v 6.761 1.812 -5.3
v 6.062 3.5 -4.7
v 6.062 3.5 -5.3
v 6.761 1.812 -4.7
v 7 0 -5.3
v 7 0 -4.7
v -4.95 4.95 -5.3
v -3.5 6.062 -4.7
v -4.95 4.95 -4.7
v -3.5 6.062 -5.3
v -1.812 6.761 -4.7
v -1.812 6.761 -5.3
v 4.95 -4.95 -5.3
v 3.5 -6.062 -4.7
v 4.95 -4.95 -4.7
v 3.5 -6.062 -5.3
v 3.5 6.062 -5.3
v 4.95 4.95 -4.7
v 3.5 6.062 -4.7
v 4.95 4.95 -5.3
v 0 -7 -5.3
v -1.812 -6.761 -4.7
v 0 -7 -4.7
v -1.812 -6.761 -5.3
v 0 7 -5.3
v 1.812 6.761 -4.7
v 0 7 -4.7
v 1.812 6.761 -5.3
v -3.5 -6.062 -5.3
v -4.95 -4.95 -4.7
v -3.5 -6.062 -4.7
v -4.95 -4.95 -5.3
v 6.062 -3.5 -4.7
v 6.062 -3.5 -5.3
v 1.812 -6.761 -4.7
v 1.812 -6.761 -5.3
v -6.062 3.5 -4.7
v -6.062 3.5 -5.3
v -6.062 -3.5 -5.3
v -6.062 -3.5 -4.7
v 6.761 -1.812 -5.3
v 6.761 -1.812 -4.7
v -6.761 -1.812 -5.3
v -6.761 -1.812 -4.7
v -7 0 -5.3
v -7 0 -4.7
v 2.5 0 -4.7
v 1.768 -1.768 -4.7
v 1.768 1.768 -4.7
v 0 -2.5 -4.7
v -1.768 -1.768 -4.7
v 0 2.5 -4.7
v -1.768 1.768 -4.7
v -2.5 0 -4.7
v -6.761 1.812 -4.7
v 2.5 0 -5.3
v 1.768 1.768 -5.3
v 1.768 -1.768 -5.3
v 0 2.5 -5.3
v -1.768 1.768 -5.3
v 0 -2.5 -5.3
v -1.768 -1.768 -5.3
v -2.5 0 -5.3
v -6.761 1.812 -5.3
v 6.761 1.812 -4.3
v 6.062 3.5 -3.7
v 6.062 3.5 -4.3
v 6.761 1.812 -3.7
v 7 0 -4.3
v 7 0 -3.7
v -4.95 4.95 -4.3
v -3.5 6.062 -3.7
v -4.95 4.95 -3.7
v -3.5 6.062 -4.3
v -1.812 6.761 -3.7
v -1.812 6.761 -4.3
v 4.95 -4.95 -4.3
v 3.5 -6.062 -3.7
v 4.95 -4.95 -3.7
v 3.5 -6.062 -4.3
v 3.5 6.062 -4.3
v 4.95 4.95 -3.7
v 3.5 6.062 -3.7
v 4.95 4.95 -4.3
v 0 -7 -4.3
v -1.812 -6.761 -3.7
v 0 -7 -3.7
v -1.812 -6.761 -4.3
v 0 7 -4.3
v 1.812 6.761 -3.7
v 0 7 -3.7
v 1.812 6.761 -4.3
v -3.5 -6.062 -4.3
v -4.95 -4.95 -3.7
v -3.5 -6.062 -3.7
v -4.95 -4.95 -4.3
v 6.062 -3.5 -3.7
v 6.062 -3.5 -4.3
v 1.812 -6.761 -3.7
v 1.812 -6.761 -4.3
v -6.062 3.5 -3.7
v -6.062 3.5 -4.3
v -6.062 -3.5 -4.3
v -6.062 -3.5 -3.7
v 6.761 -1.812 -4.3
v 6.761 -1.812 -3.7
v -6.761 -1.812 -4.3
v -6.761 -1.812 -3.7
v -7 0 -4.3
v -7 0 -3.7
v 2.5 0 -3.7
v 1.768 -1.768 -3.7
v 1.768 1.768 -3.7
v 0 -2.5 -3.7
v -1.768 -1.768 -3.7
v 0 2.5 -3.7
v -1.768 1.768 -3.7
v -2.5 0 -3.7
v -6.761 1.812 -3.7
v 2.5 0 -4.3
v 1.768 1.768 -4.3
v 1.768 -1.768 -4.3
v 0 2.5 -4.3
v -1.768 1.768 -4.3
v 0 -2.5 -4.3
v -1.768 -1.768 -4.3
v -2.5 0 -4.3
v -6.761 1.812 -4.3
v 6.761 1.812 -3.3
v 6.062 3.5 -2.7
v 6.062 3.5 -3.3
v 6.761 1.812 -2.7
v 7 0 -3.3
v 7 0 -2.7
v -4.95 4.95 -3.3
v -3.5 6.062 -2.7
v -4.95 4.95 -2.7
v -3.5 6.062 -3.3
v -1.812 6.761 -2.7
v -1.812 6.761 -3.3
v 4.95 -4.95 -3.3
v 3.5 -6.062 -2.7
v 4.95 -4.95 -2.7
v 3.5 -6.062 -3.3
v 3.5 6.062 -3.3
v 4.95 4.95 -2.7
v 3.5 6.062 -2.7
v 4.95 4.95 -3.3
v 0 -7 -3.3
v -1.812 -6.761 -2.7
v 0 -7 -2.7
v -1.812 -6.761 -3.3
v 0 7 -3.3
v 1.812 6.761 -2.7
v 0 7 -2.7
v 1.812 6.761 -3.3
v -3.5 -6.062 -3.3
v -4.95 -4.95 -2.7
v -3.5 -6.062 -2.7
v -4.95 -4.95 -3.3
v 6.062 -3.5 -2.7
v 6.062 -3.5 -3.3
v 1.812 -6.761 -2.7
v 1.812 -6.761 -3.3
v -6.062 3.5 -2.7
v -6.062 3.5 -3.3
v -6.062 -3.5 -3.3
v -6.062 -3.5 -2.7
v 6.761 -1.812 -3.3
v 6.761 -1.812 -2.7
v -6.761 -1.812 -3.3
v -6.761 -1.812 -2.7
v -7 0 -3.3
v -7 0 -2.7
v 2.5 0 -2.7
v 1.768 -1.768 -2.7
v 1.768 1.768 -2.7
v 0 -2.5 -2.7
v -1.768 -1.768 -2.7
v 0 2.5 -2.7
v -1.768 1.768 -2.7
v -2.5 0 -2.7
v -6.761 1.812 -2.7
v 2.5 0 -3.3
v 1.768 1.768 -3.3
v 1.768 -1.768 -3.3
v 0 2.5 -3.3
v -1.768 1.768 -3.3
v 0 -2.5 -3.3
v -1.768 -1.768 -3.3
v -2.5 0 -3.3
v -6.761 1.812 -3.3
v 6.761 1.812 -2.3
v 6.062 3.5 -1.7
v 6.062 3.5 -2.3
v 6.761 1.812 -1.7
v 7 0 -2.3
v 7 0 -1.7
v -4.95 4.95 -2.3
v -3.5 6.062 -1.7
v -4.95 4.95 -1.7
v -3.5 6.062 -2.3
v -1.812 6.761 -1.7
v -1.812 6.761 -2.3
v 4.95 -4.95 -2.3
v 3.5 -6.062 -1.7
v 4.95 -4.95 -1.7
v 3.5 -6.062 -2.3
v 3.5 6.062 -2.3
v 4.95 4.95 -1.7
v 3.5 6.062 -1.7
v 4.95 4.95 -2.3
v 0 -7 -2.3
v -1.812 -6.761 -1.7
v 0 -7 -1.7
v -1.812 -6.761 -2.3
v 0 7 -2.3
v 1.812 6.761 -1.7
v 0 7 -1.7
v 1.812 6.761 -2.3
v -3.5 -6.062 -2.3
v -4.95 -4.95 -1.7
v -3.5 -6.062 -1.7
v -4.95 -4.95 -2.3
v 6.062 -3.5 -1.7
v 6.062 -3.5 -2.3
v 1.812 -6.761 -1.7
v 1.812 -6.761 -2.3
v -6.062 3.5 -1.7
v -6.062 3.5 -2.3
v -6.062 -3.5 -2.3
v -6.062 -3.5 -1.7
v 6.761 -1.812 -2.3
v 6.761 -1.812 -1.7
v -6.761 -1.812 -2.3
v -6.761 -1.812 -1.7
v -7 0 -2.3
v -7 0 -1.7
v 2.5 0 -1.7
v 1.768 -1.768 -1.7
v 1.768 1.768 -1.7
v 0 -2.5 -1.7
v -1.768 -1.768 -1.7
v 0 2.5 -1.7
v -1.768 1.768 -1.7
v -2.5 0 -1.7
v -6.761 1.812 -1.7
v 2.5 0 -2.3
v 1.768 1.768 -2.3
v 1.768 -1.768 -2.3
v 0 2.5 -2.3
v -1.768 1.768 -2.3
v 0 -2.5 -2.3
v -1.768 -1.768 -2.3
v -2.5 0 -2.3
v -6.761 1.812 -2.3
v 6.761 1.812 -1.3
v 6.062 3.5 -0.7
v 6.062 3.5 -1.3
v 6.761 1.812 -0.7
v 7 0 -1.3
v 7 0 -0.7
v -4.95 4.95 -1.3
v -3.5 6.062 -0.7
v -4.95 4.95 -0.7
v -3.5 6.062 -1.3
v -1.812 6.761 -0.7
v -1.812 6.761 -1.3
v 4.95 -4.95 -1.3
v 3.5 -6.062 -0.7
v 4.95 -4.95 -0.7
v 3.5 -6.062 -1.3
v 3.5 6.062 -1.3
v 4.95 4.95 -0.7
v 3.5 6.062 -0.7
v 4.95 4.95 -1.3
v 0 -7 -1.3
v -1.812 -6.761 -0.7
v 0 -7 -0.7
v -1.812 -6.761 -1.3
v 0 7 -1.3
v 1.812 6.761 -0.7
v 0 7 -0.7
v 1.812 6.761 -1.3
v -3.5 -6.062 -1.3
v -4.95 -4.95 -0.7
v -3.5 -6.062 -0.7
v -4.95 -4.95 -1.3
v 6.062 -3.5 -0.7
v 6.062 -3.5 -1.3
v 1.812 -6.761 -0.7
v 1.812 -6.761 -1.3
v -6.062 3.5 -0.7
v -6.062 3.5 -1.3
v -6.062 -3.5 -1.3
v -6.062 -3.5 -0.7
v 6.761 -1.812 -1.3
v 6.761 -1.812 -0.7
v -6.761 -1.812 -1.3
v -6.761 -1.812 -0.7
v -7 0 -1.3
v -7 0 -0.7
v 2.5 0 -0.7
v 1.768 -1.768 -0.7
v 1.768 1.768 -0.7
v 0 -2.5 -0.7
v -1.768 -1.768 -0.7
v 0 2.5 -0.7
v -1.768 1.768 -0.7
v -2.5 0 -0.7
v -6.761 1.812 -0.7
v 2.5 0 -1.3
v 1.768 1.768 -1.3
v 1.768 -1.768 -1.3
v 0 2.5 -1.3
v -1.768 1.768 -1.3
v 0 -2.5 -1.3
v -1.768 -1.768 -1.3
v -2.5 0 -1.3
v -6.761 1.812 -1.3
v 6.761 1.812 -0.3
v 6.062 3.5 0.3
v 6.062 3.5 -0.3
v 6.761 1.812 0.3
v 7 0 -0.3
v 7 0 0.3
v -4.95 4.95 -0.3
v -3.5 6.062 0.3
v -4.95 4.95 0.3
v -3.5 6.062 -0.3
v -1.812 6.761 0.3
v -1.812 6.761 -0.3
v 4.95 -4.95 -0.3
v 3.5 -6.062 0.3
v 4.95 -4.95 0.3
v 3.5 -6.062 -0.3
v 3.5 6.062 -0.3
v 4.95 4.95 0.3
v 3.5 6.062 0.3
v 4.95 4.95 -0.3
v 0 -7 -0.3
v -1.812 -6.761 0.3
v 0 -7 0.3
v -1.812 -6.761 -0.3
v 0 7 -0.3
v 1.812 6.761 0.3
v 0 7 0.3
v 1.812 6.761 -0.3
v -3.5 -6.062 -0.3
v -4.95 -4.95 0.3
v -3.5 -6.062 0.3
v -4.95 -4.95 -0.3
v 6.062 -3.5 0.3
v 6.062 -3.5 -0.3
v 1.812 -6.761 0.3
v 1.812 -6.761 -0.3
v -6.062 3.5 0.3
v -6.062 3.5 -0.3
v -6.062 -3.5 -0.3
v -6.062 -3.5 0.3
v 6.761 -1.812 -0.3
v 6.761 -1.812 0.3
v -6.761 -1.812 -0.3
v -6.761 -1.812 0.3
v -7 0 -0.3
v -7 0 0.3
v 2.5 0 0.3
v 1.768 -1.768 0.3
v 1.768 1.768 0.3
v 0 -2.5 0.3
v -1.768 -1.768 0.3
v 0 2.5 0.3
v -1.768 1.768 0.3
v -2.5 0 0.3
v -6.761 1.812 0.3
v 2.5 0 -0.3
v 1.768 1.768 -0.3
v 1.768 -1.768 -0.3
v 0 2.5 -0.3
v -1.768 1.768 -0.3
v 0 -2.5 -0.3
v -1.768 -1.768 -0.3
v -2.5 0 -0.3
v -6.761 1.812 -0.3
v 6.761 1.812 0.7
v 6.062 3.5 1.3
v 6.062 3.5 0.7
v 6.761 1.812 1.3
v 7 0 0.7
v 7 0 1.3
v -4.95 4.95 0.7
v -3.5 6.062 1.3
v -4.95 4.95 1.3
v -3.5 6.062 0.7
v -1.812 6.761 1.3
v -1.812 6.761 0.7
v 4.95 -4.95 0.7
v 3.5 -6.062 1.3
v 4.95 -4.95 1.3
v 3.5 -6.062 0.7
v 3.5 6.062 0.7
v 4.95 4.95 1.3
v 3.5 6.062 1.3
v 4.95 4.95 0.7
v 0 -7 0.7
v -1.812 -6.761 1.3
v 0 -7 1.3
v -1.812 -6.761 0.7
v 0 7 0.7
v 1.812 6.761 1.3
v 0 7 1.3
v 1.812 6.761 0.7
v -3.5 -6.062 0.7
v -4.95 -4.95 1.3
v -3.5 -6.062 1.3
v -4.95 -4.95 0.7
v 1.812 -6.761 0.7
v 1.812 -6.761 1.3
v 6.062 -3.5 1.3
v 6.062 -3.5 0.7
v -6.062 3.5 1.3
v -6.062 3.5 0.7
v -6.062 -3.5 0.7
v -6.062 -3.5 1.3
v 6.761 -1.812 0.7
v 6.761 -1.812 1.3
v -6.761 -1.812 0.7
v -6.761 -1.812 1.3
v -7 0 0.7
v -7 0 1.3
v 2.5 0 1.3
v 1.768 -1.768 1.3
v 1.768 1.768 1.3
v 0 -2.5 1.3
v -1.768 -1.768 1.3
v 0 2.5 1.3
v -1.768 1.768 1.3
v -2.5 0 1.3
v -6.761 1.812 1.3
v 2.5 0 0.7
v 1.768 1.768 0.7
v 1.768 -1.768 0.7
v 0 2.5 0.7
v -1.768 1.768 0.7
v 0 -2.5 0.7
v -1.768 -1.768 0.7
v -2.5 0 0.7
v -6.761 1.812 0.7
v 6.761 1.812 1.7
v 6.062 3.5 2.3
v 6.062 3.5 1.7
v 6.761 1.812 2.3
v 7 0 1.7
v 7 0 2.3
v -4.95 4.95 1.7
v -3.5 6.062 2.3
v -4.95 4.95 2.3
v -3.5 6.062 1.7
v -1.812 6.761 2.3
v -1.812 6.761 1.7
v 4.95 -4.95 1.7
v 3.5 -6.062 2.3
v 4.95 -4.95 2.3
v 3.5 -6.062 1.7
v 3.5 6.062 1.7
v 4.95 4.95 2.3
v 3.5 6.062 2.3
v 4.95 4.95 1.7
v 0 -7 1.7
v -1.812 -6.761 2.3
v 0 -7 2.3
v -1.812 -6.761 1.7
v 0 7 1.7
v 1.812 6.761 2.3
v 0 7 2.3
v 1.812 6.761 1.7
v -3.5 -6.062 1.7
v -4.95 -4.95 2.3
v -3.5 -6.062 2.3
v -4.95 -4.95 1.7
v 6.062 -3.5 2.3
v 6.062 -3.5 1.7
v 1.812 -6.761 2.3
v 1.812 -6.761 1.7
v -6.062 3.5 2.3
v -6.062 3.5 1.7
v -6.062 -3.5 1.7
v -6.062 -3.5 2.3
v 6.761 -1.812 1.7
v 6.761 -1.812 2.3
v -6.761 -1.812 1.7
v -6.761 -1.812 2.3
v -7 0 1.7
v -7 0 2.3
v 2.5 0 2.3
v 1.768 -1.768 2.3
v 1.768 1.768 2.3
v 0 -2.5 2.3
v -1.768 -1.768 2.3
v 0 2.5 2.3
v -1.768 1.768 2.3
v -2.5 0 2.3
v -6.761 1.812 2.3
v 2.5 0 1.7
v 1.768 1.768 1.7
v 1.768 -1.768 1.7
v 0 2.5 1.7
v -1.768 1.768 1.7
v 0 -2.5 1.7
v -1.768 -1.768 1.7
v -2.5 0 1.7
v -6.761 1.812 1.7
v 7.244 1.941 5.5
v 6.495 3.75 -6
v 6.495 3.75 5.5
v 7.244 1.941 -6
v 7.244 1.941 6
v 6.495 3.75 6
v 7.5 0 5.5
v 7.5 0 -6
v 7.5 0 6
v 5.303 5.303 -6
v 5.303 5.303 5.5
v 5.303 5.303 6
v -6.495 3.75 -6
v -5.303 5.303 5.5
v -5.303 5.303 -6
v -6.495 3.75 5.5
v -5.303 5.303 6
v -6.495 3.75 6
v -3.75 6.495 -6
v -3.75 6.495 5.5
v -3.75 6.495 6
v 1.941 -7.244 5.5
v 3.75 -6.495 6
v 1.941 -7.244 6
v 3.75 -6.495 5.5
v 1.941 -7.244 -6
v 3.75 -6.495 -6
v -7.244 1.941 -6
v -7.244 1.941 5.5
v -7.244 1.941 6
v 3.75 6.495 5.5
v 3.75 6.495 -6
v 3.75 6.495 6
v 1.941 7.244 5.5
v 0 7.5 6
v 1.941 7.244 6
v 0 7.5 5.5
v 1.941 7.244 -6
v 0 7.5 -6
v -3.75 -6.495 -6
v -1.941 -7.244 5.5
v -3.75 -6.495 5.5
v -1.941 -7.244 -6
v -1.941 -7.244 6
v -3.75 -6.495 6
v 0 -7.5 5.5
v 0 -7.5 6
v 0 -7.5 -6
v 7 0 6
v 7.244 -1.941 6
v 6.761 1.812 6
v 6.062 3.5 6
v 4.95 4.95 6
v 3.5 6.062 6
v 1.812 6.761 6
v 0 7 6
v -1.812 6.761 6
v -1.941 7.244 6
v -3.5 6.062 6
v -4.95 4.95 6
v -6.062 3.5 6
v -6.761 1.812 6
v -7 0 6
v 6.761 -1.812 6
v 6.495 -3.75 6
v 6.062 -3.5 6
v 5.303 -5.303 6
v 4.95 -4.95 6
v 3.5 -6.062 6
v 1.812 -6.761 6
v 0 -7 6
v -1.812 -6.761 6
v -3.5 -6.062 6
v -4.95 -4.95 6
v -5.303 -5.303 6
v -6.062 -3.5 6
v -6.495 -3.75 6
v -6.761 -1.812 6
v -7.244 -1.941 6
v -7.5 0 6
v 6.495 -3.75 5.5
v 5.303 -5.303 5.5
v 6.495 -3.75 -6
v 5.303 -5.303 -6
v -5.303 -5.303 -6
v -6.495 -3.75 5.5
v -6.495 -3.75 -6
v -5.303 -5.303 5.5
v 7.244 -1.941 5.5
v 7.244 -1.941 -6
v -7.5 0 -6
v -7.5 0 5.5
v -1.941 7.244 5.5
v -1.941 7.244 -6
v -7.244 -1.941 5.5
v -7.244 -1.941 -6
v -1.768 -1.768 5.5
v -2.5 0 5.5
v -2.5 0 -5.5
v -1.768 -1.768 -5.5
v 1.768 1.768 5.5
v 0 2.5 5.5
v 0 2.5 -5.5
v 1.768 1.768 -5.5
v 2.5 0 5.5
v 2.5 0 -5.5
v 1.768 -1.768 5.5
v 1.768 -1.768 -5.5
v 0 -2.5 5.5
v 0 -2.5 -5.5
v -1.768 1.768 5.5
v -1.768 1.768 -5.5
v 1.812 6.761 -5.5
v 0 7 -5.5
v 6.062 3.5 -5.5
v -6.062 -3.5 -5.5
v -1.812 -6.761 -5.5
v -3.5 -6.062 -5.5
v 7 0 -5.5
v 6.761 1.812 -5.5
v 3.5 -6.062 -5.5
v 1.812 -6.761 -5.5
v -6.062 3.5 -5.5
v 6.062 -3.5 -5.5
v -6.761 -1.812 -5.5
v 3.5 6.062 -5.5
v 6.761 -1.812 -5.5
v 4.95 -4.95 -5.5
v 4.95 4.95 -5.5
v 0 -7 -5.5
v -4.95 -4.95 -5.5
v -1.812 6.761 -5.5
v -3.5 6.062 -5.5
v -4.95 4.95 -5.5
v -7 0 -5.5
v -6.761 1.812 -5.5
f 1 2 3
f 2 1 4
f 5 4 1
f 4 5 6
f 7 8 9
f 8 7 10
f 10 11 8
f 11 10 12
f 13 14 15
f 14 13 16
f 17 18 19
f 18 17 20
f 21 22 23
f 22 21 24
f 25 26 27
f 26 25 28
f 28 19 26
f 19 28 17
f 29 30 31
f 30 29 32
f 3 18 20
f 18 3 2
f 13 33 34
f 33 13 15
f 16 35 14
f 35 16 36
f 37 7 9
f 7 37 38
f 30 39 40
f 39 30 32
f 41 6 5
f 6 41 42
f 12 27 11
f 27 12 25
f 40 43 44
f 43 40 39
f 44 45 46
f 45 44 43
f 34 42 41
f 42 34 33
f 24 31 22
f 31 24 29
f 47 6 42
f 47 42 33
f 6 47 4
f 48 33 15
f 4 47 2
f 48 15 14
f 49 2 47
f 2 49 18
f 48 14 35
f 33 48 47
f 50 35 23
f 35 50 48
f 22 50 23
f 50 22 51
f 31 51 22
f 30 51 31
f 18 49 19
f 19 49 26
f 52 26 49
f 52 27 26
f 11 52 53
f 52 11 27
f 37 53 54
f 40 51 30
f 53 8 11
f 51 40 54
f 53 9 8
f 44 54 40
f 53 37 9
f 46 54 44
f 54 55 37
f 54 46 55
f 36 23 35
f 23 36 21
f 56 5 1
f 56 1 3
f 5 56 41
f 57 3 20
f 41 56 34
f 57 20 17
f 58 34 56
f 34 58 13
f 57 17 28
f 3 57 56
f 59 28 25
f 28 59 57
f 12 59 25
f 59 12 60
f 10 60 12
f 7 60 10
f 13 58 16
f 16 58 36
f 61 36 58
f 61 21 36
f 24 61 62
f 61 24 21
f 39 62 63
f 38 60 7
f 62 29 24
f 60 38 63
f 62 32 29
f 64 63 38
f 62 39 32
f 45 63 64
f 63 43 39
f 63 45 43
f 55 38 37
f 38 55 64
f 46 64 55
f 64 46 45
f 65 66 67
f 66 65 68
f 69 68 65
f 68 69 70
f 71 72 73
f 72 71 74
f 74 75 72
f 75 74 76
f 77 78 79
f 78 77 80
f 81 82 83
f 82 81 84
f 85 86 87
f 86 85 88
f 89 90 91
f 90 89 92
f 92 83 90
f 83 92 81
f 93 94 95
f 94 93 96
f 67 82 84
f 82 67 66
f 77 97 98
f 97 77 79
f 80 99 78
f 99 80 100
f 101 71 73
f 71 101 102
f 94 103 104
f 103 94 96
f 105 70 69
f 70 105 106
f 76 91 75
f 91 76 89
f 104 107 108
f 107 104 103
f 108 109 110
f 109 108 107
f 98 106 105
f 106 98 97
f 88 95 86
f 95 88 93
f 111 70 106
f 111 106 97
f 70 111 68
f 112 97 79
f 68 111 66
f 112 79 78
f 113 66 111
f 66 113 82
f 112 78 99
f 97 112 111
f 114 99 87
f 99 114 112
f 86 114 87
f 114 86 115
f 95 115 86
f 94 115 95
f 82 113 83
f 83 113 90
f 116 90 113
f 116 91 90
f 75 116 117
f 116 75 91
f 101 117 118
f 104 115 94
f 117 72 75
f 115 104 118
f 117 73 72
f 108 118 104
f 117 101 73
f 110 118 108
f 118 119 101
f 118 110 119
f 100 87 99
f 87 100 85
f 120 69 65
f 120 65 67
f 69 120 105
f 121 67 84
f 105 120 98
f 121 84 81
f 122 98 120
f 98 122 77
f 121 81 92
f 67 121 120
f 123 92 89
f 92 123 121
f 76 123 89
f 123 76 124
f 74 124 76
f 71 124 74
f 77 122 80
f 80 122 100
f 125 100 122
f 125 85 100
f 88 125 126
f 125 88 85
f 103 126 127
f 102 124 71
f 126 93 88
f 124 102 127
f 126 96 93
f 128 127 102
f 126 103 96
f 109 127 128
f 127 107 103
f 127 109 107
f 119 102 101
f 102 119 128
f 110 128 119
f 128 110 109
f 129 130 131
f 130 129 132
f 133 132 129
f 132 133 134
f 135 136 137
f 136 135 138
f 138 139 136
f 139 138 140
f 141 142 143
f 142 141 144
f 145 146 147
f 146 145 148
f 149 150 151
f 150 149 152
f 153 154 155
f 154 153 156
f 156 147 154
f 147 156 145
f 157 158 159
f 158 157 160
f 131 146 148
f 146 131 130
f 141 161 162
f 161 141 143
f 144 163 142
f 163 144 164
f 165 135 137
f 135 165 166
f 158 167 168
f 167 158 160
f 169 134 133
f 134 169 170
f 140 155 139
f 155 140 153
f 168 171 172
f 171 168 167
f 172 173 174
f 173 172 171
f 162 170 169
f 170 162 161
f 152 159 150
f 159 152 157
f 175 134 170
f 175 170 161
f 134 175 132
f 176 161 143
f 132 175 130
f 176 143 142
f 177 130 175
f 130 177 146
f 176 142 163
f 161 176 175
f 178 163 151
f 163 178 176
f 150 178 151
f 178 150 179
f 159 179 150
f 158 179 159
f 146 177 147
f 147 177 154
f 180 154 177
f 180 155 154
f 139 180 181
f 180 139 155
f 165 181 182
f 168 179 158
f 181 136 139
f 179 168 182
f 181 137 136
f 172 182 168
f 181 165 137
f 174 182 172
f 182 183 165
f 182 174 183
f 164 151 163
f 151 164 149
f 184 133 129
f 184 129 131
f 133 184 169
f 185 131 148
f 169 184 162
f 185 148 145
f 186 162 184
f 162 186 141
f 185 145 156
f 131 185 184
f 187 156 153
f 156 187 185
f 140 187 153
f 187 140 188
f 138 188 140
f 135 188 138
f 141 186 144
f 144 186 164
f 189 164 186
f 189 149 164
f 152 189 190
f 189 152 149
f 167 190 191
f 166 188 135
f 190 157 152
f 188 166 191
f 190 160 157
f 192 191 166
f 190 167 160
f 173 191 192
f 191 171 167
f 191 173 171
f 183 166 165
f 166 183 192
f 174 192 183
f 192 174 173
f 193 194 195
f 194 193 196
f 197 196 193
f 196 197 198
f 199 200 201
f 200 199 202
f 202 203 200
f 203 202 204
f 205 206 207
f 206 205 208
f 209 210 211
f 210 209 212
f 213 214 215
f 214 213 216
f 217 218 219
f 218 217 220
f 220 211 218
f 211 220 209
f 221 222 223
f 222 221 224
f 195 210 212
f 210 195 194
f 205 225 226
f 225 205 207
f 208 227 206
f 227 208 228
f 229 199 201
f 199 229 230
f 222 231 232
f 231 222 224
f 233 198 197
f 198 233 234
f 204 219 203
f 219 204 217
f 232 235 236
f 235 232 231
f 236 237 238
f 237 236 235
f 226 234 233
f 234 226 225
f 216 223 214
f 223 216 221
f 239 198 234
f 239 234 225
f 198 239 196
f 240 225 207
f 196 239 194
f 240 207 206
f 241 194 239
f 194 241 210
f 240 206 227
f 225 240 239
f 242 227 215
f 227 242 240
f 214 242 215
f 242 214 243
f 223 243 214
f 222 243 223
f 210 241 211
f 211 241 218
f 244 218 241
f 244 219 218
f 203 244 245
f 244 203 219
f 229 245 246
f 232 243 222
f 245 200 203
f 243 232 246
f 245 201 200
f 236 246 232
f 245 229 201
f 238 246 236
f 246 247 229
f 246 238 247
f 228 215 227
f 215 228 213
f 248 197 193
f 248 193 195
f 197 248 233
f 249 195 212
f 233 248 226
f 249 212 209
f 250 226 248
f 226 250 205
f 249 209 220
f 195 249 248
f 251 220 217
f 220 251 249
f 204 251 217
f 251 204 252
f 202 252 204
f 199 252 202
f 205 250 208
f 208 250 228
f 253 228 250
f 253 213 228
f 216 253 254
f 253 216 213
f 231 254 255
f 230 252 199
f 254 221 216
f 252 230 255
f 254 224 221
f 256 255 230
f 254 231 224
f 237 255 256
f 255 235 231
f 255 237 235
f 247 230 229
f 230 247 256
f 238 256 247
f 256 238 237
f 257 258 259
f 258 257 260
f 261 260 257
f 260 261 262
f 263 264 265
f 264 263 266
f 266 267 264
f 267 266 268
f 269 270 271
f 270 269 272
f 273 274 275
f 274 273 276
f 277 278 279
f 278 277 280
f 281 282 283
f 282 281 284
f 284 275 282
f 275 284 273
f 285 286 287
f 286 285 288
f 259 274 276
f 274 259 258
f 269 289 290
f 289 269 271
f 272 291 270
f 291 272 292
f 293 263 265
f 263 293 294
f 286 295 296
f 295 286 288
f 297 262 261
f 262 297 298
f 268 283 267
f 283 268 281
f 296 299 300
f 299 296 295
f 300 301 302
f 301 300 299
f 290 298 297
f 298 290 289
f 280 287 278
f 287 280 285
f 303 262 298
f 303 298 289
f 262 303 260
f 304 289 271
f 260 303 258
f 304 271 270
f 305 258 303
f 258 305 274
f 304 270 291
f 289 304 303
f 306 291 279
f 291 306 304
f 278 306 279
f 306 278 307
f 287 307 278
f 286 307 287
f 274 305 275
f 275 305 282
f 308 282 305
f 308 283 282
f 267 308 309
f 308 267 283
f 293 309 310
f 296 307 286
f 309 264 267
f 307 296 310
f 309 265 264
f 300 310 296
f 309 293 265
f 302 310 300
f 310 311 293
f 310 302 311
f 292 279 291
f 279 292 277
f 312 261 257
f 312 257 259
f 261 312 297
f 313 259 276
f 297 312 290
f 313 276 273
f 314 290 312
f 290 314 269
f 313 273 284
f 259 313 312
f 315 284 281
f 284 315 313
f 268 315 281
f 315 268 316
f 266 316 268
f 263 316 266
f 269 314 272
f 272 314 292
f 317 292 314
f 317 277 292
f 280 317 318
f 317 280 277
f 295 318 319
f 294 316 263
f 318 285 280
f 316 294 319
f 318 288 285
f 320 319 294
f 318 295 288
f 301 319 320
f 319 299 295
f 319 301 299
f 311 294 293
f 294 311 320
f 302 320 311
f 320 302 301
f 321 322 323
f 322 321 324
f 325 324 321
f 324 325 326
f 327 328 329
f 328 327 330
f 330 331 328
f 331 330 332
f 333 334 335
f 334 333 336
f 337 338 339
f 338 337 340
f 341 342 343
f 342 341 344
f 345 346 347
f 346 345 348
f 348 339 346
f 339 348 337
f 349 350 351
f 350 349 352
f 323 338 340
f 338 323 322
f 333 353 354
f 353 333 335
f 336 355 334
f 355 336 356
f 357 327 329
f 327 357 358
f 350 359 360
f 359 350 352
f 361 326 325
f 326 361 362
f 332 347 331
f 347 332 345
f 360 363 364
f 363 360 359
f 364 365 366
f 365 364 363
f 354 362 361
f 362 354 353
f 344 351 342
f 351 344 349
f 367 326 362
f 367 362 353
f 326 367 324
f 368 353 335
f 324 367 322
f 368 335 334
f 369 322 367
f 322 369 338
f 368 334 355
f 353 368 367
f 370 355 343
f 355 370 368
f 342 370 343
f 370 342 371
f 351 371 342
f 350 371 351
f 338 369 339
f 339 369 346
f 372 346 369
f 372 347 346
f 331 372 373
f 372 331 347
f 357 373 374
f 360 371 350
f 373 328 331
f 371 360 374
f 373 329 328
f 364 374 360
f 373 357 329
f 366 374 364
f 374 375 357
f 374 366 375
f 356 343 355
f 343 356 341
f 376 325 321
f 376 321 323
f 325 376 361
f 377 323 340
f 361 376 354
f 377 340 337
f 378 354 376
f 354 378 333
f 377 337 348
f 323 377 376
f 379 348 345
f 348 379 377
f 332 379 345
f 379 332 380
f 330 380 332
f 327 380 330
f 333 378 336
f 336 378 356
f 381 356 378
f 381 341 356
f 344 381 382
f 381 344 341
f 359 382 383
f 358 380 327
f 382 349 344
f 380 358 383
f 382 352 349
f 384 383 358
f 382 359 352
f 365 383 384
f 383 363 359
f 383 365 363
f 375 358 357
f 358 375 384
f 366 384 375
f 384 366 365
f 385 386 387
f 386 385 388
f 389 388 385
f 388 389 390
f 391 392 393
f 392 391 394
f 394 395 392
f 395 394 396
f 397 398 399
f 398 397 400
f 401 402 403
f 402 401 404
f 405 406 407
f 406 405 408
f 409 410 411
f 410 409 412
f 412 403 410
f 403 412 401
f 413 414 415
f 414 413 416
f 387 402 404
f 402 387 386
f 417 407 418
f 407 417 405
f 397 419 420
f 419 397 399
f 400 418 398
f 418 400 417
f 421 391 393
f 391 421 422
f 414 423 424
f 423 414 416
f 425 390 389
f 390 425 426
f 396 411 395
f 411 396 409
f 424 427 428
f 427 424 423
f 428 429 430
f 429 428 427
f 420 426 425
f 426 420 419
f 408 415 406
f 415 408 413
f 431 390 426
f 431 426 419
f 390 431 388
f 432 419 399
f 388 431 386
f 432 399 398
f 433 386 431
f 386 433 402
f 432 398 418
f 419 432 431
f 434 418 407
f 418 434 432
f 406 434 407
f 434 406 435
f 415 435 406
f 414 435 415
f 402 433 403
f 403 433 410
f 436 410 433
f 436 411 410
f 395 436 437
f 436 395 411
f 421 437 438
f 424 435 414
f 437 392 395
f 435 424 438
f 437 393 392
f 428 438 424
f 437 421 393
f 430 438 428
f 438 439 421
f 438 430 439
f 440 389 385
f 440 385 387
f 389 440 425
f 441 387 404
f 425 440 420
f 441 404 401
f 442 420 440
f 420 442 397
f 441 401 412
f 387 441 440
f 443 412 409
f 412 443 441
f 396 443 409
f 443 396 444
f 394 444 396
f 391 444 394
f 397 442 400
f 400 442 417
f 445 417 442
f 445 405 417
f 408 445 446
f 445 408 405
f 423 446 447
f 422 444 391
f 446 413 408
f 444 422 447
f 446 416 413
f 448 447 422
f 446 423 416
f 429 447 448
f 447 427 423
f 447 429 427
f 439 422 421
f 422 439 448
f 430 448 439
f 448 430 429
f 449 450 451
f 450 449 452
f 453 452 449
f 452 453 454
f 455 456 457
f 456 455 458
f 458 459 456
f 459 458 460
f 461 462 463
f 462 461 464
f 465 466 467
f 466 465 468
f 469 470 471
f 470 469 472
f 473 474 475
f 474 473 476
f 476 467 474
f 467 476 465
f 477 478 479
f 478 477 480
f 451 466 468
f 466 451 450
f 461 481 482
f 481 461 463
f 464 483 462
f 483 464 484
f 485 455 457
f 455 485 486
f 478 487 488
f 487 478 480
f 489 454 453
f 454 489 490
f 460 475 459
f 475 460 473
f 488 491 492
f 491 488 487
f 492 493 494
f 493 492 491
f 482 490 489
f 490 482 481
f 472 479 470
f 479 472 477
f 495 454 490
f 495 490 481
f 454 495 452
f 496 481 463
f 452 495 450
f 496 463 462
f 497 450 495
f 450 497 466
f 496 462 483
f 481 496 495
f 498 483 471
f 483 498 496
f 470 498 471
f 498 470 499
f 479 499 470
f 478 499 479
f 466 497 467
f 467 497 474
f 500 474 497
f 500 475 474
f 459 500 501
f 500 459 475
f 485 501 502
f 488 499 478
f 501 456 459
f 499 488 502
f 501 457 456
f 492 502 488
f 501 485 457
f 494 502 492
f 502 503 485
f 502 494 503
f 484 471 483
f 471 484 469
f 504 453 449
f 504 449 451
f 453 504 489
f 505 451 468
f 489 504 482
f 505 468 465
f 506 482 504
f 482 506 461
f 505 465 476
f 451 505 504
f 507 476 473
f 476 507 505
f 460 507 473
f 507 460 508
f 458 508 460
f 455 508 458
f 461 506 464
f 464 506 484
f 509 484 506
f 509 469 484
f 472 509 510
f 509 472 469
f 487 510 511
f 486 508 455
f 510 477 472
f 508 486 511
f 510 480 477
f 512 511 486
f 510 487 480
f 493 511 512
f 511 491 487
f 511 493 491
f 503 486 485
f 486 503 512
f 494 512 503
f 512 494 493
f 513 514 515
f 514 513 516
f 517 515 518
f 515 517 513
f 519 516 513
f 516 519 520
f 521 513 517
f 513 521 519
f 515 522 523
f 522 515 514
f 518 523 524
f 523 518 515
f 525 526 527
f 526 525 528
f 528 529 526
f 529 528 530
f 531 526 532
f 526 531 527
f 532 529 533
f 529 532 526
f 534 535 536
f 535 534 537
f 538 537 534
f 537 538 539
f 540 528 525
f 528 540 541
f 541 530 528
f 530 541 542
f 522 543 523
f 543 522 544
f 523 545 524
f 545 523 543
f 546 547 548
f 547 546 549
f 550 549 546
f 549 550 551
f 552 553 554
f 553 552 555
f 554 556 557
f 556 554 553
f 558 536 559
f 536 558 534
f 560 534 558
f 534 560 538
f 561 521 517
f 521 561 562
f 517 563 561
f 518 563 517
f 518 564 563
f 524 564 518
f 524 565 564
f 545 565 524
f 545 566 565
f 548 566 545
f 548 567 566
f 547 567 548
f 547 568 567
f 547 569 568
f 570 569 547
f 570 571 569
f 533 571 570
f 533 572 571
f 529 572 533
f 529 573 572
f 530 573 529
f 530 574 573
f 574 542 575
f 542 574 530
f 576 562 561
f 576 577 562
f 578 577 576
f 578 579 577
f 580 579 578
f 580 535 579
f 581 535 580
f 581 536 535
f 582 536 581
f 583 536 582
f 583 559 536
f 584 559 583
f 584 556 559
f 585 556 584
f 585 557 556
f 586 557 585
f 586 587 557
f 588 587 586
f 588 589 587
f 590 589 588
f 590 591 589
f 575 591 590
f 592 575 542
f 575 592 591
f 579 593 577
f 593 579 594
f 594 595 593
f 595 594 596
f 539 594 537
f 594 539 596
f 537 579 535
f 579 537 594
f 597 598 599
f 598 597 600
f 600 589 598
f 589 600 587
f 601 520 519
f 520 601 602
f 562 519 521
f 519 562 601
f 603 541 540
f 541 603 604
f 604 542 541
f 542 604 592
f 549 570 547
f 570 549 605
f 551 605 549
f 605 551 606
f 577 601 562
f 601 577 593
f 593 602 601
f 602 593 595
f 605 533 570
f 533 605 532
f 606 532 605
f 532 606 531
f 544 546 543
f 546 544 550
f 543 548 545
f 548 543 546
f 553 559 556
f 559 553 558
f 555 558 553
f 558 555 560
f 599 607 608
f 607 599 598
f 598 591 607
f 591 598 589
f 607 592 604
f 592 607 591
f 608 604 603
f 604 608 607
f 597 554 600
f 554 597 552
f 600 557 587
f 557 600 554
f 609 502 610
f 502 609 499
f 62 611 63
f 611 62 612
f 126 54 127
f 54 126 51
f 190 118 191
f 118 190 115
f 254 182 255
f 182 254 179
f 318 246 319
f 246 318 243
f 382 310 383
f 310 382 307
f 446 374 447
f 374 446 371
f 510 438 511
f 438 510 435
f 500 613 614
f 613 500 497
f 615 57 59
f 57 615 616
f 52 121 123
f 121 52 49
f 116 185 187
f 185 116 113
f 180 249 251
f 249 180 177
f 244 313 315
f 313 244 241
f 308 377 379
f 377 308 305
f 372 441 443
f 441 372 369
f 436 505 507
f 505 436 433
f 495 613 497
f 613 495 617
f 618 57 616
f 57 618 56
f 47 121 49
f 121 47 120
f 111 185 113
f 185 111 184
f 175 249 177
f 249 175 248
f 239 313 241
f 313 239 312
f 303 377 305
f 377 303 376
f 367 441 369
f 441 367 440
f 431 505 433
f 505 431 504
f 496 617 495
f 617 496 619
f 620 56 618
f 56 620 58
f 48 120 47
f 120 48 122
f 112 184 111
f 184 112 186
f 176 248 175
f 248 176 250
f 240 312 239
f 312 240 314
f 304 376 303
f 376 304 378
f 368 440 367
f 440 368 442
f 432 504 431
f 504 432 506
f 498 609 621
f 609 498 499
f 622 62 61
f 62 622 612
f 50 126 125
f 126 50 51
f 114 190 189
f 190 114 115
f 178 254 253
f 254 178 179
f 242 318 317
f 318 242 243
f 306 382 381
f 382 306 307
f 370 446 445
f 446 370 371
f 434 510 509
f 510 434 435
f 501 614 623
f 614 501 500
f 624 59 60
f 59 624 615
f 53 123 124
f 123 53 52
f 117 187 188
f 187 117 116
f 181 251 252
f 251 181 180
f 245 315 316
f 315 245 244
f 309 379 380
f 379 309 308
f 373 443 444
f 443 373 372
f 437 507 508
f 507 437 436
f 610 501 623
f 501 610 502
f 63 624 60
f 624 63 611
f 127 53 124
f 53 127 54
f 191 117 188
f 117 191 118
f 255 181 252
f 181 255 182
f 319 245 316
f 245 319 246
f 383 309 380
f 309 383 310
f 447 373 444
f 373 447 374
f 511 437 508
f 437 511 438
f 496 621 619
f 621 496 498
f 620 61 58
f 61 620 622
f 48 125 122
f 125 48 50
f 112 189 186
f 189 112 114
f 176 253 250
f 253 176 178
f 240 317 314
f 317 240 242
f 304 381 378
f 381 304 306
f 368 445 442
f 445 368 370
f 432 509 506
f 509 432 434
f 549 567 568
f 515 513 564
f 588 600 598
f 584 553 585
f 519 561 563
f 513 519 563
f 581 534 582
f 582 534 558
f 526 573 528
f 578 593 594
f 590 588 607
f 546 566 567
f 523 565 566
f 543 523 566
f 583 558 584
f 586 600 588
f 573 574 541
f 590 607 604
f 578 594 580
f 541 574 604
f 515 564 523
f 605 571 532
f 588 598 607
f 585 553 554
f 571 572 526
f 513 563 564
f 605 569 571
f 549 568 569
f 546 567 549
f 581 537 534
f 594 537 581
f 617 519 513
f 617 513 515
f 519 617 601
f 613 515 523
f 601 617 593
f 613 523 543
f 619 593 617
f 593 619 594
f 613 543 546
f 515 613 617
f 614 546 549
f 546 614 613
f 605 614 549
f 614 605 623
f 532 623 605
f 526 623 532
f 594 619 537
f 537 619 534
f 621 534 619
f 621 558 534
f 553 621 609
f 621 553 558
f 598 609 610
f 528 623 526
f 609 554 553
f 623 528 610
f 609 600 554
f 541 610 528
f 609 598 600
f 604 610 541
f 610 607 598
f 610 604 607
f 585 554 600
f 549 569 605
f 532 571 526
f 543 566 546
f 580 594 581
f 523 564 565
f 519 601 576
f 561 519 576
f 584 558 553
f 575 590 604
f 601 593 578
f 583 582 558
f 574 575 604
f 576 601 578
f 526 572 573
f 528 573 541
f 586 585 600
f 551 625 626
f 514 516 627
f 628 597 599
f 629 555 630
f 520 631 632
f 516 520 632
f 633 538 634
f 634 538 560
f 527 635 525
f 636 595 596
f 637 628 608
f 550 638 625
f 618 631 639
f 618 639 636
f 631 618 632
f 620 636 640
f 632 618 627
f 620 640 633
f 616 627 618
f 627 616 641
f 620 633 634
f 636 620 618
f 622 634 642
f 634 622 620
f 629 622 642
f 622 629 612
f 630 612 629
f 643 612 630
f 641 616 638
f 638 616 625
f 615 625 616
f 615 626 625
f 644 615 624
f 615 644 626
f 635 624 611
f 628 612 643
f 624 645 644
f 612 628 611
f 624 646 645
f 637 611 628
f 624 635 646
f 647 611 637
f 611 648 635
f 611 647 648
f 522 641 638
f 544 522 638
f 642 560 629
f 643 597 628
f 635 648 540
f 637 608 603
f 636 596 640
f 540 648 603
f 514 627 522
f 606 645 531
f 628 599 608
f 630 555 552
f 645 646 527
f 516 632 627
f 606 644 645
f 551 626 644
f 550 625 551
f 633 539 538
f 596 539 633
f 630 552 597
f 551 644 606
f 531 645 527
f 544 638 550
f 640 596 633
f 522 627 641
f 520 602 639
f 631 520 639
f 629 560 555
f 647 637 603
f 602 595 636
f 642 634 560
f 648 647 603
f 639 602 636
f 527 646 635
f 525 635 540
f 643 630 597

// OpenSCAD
// Parameters
outer_diameter_mm = 15.0; //[7.5:30.0:0.1]
length_mm = 12.0; //[6.0:24.0:0.1]
screw_nominal_diameter_mm = 6.0; //[3.0:12.0:0.1]
internal_thread_pitch_mm = 1.0; //[0.5:2.0:0.1]
internal_minor_diameter_mm = 5.0; //[2.5:10.0:0.1]
internal_clearance_diameter_mm = 6.4; //[3.2:12.8:0.1]
lead_in_chamfer_mm = 0.5; //[0.25:1.5:0.05]
installation_end_chamfer_mm = 0.5; //[0.25:1.5:0.05]
outer_knurl_depth_mm = 0.5; //[0.2:1.5:0.05]
outer_knurl_pitch_mm = 1.0; //[0.5:2.5:0.1]
knurl_groove_width_mm = 0.6; //[0.3:1.5:0.05]
knurl_groove_count = 8; //[3:20:1]
overlap_mm = 1.0; //[0.5:2.0:0.1]

// Threaded Insert - complete geometry
module threaded_insert() {
  color("Brass") {
    // Insert Body
    difference() {
      cylinder(r=outer_diameter_mm/2, h=length_mm, center=true);
      
      // Internal Bore
      translate([0, 0, 0])
        cylinder(r=internal_minor_diameter_mm/2, h=length_mm + 2*overlap_mm, center=true);
      
      // Lead-in Chamfer
      translate([0, 0, length_mm/2 - lead_in_chamfer_mm/2])
        cylinder(r1=outer_diameter_mm/2, r2=outer_diameter_mm/2 - lead_in_chamfer_mm, h=lead_in_chamfer_mm, center=true);
      
      // Installation End Chamfer
      translate([0, 0, -length_mm/2 + installation_end_chamfer_mm/2])
        cylinder(r1=outer_diameter_mm/2, r2=outer_diameter_mm/2 - installation_end_chamfer_mm, h=installation_end_chamfer_mm, center=true);
      
      // Knurl Grooves
      for (i = [1:knurl_groove_count]) {
        translate([0, 0, -length_mm/2 + outer_knurl_pitch_mm*i])
          scale([(outer_diameter_mm - 2*outer_knurl_depth_mm)/outer_diameter_mm, (outer_diameter_mm - 2*outer_knurl_depth_mm)/outer_diameter_mm, 1])
          cylinder(r=outer_diameter_mm/2, h=knurl_groove_width_mm, center=true);
      }
    }
  }
}

// Assembly
module assembly() {
  threaded_insert();
}

assembly();
